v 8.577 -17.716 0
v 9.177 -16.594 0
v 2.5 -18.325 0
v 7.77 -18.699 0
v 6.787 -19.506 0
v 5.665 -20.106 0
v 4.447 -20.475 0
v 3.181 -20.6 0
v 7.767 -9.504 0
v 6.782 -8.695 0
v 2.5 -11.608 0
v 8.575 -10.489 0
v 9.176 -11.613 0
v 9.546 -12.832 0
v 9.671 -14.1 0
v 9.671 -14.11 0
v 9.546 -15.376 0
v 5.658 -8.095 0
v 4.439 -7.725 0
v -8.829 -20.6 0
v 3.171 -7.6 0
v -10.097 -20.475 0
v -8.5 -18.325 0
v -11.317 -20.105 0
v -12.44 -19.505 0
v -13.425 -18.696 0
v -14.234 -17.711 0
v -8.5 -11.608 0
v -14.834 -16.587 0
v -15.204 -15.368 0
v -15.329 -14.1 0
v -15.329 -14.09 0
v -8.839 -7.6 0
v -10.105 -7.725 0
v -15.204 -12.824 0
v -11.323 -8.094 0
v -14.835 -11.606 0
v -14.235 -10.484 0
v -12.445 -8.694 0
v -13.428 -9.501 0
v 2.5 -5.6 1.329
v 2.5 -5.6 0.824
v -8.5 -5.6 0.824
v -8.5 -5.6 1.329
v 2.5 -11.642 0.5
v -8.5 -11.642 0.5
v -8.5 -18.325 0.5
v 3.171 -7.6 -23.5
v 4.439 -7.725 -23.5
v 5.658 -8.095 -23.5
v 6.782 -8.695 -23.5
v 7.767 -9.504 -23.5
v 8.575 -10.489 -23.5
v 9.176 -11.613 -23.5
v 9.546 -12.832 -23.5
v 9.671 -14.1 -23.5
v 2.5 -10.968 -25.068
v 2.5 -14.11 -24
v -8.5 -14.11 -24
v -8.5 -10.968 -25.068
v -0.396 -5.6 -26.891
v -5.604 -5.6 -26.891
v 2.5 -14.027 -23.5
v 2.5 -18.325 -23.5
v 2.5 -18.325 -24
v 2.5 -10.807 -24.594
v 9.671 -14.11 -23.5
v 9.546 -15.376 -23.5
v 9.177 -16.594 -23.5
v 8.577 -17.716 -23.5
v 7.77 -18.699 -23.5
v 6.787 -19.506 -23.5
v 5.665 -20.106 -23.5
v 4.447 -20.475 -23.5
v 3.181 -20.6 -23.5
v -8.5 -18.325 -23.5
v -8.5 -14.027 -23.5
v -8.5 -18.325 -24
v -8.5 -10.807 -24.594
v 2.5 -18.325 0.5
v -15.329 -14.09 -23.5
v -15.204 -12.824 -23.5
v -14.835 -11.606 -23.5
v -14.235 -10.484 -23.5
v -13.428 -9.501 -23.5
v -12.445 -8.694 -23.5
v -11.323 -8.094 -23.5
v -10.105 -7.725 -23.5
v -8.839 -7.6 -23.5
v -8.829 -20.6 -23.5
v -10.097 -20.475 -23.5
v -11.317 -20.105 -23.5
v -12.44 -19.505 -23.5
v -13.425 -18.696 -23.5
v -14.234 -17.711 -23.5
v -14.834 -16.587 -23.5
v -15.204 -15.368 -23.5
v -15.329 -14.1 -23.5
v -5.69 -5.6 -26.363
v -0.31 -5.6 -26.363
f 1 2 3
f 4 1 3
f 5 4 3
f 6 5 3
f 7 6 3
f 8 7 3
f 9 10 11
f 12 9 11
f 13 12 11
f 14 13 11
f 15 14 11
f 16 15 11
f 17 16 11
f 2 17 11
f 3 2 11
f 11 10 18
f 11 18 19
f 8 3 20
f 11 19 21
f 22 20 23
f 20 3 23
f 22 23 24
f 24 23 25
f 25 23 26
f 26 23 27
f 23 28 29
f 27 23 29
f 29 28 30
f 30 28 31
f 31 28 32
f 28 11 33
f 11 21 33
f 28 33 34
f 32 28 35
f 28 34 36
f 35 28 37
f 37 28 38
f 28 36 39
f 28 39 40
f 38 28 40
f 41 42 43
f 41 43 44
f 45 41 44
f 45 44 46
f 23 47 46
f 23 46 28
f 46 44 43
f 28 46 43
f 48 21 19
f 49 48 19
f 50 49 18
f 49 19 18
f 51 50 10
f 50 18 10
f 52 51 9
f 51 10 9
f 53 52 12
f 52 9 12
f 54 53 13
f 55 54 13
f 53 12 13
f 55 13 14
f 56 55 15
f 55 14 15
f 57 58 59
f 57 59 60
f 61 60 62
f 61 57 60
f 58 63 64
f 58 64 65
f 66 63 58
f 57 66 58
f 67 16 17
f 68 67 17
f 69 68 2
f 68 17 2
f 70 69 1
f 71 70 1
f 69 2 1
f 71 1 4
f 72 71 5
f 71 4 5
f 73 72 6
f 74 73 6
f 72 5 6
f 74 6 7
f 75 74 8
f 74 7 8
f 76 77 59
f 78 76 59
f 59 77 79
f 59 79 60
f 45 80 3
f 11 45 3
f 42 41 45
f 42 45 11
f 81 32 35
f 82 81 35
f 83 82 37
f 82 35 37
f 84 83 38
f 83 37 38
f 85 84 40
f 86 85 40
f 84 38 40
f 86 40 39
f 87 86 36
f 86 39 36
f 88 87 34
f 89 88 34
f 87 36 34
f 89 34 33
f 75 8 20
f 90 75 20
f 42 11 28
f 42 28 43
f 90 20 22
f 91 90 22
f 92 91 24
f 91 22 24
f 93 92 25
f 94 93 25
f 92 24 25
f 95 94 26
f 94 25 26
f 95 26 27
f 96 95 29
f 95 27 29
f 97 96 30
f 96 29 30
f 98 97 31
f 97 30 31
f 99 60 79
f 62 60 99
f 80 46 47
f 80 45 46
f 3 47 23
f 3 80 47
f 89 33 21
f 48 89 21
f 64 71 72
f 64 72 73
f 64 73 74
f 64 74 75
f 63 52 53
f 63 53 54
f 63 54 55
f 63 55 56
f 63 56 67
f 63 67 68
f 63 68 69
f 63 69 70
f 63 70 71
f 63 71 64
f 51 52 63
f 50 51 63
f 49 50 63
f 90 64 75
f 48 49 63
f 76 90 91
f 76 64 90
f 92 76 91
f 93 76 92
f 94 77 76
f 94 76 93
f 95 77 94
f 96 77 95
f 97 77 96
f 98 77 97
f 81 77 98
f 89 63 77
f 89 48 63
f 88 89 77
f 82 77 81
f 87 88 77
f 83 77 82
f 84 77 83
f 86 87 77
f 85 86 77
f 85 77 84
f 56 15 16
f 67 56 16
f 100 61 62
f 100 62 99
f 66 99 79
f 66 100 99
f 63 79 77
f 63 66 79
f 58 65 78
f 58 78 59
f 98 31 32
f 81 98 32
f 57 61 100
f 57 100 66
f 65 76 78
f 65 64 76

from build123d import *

# Parameters (mm, degrees)
EXTRUSION1_DEPTH        = 23.5
EXTRUSION2_DEPTH        = 5.5
EXTRUSION3_DEPTH        = 5.5
ENL_V_MAT_EXTRU_1_DEPTH = 0.5


with BuildPart() as part:
    # Esquisse1 → Extrusion1 (new body)
    with BuildSketch(Plane.XY):
        with BuildLine():
            Line((-8.839098079, -7.6), (3.170901921, -7.6))
            ThreePointArc((3.170901921, -7.6), (7.767095998, -9.503805922), (9.670901921, -14.1))
            Line((9.670901921, -14.1), (9.670901921, -14.11))
            ThreePointArc((9.670901921, -14.11), (7.770024931, -18.69912301), (3.180901921, -20.6))
            Line((3.180901921, -20.6), (-8.829098079, -20.6))
            ThreePointArc((-8.829098079, -20.6), (-13.425292157, -18.696194078), (-15.329098079, -14.1))
            Line((-15.329098079, -14.1), (-15.329098079, -14.09))
            ThreePointArc((-15.329098079, -14.09), (-13.428221089, -9.50087699), (-8.839098079, -7.6))
        make_face()
    extrude(amount=-EXTRUSION1_DEPTH)

    # Esquisse2 → Extrusion2 (add, symmetric)
    with BuildSketch(Plane(origin=(-3, 0, 0), x_dir=(0, 0, -1), z_dir=(1, 0, 0))):
        Polygon((0, -18.324724565), (0, -11.607872713), (-0.824207274, -5.6), (-1.328890469, -5.6), (-0.5, -11.64200981), (-0.5, -18.324724565), align=None)
    extrude(amount=EXTRUSION2_DEPTH, both=True)

    # Esquisse3 → Extrusion3 (add, symmetric)
    with BuildSketch(Plane(origin=(-3, 0, 0), x_dir=(0, 0, -1), z_dir=(1, 0, 0))):
        Polygon((23.5, -18.324724565), (24, -18.324724565), (24, -14.11), (26.890994991, -5.6), (26.362930623, -5.6), (23.5, -14.027389076), align=None)
    extrude(amount=EXTRUSION3_DEPTH, both=True)

    # Esquisse4 → Enlèv. mat.-Extru.1 (cut)
    with BuildSketch(Plane(origin=(0, -8.769547771, -25.814244494), x_dir=(-1, 0, 0), z_dir=(0, -0.32166286073299966, -0.9468542675750388))):
        Polygon((0.645397002, 3.83477814), (-2.5, -2.321461893), (-3.257578705, -2.321461893), (-3.257578705, 4.719989125), (9.257578705, 4.719989125), (9.257578705, -2.321461893), (8.5, -2.321461893), (5.354602998, 3.83477814), align=None)
    extrude(amount=-ENL_V_MAT_EXTRU_1_DEPTH, mode=Mode.SUBTRACT)


solid = part.part
